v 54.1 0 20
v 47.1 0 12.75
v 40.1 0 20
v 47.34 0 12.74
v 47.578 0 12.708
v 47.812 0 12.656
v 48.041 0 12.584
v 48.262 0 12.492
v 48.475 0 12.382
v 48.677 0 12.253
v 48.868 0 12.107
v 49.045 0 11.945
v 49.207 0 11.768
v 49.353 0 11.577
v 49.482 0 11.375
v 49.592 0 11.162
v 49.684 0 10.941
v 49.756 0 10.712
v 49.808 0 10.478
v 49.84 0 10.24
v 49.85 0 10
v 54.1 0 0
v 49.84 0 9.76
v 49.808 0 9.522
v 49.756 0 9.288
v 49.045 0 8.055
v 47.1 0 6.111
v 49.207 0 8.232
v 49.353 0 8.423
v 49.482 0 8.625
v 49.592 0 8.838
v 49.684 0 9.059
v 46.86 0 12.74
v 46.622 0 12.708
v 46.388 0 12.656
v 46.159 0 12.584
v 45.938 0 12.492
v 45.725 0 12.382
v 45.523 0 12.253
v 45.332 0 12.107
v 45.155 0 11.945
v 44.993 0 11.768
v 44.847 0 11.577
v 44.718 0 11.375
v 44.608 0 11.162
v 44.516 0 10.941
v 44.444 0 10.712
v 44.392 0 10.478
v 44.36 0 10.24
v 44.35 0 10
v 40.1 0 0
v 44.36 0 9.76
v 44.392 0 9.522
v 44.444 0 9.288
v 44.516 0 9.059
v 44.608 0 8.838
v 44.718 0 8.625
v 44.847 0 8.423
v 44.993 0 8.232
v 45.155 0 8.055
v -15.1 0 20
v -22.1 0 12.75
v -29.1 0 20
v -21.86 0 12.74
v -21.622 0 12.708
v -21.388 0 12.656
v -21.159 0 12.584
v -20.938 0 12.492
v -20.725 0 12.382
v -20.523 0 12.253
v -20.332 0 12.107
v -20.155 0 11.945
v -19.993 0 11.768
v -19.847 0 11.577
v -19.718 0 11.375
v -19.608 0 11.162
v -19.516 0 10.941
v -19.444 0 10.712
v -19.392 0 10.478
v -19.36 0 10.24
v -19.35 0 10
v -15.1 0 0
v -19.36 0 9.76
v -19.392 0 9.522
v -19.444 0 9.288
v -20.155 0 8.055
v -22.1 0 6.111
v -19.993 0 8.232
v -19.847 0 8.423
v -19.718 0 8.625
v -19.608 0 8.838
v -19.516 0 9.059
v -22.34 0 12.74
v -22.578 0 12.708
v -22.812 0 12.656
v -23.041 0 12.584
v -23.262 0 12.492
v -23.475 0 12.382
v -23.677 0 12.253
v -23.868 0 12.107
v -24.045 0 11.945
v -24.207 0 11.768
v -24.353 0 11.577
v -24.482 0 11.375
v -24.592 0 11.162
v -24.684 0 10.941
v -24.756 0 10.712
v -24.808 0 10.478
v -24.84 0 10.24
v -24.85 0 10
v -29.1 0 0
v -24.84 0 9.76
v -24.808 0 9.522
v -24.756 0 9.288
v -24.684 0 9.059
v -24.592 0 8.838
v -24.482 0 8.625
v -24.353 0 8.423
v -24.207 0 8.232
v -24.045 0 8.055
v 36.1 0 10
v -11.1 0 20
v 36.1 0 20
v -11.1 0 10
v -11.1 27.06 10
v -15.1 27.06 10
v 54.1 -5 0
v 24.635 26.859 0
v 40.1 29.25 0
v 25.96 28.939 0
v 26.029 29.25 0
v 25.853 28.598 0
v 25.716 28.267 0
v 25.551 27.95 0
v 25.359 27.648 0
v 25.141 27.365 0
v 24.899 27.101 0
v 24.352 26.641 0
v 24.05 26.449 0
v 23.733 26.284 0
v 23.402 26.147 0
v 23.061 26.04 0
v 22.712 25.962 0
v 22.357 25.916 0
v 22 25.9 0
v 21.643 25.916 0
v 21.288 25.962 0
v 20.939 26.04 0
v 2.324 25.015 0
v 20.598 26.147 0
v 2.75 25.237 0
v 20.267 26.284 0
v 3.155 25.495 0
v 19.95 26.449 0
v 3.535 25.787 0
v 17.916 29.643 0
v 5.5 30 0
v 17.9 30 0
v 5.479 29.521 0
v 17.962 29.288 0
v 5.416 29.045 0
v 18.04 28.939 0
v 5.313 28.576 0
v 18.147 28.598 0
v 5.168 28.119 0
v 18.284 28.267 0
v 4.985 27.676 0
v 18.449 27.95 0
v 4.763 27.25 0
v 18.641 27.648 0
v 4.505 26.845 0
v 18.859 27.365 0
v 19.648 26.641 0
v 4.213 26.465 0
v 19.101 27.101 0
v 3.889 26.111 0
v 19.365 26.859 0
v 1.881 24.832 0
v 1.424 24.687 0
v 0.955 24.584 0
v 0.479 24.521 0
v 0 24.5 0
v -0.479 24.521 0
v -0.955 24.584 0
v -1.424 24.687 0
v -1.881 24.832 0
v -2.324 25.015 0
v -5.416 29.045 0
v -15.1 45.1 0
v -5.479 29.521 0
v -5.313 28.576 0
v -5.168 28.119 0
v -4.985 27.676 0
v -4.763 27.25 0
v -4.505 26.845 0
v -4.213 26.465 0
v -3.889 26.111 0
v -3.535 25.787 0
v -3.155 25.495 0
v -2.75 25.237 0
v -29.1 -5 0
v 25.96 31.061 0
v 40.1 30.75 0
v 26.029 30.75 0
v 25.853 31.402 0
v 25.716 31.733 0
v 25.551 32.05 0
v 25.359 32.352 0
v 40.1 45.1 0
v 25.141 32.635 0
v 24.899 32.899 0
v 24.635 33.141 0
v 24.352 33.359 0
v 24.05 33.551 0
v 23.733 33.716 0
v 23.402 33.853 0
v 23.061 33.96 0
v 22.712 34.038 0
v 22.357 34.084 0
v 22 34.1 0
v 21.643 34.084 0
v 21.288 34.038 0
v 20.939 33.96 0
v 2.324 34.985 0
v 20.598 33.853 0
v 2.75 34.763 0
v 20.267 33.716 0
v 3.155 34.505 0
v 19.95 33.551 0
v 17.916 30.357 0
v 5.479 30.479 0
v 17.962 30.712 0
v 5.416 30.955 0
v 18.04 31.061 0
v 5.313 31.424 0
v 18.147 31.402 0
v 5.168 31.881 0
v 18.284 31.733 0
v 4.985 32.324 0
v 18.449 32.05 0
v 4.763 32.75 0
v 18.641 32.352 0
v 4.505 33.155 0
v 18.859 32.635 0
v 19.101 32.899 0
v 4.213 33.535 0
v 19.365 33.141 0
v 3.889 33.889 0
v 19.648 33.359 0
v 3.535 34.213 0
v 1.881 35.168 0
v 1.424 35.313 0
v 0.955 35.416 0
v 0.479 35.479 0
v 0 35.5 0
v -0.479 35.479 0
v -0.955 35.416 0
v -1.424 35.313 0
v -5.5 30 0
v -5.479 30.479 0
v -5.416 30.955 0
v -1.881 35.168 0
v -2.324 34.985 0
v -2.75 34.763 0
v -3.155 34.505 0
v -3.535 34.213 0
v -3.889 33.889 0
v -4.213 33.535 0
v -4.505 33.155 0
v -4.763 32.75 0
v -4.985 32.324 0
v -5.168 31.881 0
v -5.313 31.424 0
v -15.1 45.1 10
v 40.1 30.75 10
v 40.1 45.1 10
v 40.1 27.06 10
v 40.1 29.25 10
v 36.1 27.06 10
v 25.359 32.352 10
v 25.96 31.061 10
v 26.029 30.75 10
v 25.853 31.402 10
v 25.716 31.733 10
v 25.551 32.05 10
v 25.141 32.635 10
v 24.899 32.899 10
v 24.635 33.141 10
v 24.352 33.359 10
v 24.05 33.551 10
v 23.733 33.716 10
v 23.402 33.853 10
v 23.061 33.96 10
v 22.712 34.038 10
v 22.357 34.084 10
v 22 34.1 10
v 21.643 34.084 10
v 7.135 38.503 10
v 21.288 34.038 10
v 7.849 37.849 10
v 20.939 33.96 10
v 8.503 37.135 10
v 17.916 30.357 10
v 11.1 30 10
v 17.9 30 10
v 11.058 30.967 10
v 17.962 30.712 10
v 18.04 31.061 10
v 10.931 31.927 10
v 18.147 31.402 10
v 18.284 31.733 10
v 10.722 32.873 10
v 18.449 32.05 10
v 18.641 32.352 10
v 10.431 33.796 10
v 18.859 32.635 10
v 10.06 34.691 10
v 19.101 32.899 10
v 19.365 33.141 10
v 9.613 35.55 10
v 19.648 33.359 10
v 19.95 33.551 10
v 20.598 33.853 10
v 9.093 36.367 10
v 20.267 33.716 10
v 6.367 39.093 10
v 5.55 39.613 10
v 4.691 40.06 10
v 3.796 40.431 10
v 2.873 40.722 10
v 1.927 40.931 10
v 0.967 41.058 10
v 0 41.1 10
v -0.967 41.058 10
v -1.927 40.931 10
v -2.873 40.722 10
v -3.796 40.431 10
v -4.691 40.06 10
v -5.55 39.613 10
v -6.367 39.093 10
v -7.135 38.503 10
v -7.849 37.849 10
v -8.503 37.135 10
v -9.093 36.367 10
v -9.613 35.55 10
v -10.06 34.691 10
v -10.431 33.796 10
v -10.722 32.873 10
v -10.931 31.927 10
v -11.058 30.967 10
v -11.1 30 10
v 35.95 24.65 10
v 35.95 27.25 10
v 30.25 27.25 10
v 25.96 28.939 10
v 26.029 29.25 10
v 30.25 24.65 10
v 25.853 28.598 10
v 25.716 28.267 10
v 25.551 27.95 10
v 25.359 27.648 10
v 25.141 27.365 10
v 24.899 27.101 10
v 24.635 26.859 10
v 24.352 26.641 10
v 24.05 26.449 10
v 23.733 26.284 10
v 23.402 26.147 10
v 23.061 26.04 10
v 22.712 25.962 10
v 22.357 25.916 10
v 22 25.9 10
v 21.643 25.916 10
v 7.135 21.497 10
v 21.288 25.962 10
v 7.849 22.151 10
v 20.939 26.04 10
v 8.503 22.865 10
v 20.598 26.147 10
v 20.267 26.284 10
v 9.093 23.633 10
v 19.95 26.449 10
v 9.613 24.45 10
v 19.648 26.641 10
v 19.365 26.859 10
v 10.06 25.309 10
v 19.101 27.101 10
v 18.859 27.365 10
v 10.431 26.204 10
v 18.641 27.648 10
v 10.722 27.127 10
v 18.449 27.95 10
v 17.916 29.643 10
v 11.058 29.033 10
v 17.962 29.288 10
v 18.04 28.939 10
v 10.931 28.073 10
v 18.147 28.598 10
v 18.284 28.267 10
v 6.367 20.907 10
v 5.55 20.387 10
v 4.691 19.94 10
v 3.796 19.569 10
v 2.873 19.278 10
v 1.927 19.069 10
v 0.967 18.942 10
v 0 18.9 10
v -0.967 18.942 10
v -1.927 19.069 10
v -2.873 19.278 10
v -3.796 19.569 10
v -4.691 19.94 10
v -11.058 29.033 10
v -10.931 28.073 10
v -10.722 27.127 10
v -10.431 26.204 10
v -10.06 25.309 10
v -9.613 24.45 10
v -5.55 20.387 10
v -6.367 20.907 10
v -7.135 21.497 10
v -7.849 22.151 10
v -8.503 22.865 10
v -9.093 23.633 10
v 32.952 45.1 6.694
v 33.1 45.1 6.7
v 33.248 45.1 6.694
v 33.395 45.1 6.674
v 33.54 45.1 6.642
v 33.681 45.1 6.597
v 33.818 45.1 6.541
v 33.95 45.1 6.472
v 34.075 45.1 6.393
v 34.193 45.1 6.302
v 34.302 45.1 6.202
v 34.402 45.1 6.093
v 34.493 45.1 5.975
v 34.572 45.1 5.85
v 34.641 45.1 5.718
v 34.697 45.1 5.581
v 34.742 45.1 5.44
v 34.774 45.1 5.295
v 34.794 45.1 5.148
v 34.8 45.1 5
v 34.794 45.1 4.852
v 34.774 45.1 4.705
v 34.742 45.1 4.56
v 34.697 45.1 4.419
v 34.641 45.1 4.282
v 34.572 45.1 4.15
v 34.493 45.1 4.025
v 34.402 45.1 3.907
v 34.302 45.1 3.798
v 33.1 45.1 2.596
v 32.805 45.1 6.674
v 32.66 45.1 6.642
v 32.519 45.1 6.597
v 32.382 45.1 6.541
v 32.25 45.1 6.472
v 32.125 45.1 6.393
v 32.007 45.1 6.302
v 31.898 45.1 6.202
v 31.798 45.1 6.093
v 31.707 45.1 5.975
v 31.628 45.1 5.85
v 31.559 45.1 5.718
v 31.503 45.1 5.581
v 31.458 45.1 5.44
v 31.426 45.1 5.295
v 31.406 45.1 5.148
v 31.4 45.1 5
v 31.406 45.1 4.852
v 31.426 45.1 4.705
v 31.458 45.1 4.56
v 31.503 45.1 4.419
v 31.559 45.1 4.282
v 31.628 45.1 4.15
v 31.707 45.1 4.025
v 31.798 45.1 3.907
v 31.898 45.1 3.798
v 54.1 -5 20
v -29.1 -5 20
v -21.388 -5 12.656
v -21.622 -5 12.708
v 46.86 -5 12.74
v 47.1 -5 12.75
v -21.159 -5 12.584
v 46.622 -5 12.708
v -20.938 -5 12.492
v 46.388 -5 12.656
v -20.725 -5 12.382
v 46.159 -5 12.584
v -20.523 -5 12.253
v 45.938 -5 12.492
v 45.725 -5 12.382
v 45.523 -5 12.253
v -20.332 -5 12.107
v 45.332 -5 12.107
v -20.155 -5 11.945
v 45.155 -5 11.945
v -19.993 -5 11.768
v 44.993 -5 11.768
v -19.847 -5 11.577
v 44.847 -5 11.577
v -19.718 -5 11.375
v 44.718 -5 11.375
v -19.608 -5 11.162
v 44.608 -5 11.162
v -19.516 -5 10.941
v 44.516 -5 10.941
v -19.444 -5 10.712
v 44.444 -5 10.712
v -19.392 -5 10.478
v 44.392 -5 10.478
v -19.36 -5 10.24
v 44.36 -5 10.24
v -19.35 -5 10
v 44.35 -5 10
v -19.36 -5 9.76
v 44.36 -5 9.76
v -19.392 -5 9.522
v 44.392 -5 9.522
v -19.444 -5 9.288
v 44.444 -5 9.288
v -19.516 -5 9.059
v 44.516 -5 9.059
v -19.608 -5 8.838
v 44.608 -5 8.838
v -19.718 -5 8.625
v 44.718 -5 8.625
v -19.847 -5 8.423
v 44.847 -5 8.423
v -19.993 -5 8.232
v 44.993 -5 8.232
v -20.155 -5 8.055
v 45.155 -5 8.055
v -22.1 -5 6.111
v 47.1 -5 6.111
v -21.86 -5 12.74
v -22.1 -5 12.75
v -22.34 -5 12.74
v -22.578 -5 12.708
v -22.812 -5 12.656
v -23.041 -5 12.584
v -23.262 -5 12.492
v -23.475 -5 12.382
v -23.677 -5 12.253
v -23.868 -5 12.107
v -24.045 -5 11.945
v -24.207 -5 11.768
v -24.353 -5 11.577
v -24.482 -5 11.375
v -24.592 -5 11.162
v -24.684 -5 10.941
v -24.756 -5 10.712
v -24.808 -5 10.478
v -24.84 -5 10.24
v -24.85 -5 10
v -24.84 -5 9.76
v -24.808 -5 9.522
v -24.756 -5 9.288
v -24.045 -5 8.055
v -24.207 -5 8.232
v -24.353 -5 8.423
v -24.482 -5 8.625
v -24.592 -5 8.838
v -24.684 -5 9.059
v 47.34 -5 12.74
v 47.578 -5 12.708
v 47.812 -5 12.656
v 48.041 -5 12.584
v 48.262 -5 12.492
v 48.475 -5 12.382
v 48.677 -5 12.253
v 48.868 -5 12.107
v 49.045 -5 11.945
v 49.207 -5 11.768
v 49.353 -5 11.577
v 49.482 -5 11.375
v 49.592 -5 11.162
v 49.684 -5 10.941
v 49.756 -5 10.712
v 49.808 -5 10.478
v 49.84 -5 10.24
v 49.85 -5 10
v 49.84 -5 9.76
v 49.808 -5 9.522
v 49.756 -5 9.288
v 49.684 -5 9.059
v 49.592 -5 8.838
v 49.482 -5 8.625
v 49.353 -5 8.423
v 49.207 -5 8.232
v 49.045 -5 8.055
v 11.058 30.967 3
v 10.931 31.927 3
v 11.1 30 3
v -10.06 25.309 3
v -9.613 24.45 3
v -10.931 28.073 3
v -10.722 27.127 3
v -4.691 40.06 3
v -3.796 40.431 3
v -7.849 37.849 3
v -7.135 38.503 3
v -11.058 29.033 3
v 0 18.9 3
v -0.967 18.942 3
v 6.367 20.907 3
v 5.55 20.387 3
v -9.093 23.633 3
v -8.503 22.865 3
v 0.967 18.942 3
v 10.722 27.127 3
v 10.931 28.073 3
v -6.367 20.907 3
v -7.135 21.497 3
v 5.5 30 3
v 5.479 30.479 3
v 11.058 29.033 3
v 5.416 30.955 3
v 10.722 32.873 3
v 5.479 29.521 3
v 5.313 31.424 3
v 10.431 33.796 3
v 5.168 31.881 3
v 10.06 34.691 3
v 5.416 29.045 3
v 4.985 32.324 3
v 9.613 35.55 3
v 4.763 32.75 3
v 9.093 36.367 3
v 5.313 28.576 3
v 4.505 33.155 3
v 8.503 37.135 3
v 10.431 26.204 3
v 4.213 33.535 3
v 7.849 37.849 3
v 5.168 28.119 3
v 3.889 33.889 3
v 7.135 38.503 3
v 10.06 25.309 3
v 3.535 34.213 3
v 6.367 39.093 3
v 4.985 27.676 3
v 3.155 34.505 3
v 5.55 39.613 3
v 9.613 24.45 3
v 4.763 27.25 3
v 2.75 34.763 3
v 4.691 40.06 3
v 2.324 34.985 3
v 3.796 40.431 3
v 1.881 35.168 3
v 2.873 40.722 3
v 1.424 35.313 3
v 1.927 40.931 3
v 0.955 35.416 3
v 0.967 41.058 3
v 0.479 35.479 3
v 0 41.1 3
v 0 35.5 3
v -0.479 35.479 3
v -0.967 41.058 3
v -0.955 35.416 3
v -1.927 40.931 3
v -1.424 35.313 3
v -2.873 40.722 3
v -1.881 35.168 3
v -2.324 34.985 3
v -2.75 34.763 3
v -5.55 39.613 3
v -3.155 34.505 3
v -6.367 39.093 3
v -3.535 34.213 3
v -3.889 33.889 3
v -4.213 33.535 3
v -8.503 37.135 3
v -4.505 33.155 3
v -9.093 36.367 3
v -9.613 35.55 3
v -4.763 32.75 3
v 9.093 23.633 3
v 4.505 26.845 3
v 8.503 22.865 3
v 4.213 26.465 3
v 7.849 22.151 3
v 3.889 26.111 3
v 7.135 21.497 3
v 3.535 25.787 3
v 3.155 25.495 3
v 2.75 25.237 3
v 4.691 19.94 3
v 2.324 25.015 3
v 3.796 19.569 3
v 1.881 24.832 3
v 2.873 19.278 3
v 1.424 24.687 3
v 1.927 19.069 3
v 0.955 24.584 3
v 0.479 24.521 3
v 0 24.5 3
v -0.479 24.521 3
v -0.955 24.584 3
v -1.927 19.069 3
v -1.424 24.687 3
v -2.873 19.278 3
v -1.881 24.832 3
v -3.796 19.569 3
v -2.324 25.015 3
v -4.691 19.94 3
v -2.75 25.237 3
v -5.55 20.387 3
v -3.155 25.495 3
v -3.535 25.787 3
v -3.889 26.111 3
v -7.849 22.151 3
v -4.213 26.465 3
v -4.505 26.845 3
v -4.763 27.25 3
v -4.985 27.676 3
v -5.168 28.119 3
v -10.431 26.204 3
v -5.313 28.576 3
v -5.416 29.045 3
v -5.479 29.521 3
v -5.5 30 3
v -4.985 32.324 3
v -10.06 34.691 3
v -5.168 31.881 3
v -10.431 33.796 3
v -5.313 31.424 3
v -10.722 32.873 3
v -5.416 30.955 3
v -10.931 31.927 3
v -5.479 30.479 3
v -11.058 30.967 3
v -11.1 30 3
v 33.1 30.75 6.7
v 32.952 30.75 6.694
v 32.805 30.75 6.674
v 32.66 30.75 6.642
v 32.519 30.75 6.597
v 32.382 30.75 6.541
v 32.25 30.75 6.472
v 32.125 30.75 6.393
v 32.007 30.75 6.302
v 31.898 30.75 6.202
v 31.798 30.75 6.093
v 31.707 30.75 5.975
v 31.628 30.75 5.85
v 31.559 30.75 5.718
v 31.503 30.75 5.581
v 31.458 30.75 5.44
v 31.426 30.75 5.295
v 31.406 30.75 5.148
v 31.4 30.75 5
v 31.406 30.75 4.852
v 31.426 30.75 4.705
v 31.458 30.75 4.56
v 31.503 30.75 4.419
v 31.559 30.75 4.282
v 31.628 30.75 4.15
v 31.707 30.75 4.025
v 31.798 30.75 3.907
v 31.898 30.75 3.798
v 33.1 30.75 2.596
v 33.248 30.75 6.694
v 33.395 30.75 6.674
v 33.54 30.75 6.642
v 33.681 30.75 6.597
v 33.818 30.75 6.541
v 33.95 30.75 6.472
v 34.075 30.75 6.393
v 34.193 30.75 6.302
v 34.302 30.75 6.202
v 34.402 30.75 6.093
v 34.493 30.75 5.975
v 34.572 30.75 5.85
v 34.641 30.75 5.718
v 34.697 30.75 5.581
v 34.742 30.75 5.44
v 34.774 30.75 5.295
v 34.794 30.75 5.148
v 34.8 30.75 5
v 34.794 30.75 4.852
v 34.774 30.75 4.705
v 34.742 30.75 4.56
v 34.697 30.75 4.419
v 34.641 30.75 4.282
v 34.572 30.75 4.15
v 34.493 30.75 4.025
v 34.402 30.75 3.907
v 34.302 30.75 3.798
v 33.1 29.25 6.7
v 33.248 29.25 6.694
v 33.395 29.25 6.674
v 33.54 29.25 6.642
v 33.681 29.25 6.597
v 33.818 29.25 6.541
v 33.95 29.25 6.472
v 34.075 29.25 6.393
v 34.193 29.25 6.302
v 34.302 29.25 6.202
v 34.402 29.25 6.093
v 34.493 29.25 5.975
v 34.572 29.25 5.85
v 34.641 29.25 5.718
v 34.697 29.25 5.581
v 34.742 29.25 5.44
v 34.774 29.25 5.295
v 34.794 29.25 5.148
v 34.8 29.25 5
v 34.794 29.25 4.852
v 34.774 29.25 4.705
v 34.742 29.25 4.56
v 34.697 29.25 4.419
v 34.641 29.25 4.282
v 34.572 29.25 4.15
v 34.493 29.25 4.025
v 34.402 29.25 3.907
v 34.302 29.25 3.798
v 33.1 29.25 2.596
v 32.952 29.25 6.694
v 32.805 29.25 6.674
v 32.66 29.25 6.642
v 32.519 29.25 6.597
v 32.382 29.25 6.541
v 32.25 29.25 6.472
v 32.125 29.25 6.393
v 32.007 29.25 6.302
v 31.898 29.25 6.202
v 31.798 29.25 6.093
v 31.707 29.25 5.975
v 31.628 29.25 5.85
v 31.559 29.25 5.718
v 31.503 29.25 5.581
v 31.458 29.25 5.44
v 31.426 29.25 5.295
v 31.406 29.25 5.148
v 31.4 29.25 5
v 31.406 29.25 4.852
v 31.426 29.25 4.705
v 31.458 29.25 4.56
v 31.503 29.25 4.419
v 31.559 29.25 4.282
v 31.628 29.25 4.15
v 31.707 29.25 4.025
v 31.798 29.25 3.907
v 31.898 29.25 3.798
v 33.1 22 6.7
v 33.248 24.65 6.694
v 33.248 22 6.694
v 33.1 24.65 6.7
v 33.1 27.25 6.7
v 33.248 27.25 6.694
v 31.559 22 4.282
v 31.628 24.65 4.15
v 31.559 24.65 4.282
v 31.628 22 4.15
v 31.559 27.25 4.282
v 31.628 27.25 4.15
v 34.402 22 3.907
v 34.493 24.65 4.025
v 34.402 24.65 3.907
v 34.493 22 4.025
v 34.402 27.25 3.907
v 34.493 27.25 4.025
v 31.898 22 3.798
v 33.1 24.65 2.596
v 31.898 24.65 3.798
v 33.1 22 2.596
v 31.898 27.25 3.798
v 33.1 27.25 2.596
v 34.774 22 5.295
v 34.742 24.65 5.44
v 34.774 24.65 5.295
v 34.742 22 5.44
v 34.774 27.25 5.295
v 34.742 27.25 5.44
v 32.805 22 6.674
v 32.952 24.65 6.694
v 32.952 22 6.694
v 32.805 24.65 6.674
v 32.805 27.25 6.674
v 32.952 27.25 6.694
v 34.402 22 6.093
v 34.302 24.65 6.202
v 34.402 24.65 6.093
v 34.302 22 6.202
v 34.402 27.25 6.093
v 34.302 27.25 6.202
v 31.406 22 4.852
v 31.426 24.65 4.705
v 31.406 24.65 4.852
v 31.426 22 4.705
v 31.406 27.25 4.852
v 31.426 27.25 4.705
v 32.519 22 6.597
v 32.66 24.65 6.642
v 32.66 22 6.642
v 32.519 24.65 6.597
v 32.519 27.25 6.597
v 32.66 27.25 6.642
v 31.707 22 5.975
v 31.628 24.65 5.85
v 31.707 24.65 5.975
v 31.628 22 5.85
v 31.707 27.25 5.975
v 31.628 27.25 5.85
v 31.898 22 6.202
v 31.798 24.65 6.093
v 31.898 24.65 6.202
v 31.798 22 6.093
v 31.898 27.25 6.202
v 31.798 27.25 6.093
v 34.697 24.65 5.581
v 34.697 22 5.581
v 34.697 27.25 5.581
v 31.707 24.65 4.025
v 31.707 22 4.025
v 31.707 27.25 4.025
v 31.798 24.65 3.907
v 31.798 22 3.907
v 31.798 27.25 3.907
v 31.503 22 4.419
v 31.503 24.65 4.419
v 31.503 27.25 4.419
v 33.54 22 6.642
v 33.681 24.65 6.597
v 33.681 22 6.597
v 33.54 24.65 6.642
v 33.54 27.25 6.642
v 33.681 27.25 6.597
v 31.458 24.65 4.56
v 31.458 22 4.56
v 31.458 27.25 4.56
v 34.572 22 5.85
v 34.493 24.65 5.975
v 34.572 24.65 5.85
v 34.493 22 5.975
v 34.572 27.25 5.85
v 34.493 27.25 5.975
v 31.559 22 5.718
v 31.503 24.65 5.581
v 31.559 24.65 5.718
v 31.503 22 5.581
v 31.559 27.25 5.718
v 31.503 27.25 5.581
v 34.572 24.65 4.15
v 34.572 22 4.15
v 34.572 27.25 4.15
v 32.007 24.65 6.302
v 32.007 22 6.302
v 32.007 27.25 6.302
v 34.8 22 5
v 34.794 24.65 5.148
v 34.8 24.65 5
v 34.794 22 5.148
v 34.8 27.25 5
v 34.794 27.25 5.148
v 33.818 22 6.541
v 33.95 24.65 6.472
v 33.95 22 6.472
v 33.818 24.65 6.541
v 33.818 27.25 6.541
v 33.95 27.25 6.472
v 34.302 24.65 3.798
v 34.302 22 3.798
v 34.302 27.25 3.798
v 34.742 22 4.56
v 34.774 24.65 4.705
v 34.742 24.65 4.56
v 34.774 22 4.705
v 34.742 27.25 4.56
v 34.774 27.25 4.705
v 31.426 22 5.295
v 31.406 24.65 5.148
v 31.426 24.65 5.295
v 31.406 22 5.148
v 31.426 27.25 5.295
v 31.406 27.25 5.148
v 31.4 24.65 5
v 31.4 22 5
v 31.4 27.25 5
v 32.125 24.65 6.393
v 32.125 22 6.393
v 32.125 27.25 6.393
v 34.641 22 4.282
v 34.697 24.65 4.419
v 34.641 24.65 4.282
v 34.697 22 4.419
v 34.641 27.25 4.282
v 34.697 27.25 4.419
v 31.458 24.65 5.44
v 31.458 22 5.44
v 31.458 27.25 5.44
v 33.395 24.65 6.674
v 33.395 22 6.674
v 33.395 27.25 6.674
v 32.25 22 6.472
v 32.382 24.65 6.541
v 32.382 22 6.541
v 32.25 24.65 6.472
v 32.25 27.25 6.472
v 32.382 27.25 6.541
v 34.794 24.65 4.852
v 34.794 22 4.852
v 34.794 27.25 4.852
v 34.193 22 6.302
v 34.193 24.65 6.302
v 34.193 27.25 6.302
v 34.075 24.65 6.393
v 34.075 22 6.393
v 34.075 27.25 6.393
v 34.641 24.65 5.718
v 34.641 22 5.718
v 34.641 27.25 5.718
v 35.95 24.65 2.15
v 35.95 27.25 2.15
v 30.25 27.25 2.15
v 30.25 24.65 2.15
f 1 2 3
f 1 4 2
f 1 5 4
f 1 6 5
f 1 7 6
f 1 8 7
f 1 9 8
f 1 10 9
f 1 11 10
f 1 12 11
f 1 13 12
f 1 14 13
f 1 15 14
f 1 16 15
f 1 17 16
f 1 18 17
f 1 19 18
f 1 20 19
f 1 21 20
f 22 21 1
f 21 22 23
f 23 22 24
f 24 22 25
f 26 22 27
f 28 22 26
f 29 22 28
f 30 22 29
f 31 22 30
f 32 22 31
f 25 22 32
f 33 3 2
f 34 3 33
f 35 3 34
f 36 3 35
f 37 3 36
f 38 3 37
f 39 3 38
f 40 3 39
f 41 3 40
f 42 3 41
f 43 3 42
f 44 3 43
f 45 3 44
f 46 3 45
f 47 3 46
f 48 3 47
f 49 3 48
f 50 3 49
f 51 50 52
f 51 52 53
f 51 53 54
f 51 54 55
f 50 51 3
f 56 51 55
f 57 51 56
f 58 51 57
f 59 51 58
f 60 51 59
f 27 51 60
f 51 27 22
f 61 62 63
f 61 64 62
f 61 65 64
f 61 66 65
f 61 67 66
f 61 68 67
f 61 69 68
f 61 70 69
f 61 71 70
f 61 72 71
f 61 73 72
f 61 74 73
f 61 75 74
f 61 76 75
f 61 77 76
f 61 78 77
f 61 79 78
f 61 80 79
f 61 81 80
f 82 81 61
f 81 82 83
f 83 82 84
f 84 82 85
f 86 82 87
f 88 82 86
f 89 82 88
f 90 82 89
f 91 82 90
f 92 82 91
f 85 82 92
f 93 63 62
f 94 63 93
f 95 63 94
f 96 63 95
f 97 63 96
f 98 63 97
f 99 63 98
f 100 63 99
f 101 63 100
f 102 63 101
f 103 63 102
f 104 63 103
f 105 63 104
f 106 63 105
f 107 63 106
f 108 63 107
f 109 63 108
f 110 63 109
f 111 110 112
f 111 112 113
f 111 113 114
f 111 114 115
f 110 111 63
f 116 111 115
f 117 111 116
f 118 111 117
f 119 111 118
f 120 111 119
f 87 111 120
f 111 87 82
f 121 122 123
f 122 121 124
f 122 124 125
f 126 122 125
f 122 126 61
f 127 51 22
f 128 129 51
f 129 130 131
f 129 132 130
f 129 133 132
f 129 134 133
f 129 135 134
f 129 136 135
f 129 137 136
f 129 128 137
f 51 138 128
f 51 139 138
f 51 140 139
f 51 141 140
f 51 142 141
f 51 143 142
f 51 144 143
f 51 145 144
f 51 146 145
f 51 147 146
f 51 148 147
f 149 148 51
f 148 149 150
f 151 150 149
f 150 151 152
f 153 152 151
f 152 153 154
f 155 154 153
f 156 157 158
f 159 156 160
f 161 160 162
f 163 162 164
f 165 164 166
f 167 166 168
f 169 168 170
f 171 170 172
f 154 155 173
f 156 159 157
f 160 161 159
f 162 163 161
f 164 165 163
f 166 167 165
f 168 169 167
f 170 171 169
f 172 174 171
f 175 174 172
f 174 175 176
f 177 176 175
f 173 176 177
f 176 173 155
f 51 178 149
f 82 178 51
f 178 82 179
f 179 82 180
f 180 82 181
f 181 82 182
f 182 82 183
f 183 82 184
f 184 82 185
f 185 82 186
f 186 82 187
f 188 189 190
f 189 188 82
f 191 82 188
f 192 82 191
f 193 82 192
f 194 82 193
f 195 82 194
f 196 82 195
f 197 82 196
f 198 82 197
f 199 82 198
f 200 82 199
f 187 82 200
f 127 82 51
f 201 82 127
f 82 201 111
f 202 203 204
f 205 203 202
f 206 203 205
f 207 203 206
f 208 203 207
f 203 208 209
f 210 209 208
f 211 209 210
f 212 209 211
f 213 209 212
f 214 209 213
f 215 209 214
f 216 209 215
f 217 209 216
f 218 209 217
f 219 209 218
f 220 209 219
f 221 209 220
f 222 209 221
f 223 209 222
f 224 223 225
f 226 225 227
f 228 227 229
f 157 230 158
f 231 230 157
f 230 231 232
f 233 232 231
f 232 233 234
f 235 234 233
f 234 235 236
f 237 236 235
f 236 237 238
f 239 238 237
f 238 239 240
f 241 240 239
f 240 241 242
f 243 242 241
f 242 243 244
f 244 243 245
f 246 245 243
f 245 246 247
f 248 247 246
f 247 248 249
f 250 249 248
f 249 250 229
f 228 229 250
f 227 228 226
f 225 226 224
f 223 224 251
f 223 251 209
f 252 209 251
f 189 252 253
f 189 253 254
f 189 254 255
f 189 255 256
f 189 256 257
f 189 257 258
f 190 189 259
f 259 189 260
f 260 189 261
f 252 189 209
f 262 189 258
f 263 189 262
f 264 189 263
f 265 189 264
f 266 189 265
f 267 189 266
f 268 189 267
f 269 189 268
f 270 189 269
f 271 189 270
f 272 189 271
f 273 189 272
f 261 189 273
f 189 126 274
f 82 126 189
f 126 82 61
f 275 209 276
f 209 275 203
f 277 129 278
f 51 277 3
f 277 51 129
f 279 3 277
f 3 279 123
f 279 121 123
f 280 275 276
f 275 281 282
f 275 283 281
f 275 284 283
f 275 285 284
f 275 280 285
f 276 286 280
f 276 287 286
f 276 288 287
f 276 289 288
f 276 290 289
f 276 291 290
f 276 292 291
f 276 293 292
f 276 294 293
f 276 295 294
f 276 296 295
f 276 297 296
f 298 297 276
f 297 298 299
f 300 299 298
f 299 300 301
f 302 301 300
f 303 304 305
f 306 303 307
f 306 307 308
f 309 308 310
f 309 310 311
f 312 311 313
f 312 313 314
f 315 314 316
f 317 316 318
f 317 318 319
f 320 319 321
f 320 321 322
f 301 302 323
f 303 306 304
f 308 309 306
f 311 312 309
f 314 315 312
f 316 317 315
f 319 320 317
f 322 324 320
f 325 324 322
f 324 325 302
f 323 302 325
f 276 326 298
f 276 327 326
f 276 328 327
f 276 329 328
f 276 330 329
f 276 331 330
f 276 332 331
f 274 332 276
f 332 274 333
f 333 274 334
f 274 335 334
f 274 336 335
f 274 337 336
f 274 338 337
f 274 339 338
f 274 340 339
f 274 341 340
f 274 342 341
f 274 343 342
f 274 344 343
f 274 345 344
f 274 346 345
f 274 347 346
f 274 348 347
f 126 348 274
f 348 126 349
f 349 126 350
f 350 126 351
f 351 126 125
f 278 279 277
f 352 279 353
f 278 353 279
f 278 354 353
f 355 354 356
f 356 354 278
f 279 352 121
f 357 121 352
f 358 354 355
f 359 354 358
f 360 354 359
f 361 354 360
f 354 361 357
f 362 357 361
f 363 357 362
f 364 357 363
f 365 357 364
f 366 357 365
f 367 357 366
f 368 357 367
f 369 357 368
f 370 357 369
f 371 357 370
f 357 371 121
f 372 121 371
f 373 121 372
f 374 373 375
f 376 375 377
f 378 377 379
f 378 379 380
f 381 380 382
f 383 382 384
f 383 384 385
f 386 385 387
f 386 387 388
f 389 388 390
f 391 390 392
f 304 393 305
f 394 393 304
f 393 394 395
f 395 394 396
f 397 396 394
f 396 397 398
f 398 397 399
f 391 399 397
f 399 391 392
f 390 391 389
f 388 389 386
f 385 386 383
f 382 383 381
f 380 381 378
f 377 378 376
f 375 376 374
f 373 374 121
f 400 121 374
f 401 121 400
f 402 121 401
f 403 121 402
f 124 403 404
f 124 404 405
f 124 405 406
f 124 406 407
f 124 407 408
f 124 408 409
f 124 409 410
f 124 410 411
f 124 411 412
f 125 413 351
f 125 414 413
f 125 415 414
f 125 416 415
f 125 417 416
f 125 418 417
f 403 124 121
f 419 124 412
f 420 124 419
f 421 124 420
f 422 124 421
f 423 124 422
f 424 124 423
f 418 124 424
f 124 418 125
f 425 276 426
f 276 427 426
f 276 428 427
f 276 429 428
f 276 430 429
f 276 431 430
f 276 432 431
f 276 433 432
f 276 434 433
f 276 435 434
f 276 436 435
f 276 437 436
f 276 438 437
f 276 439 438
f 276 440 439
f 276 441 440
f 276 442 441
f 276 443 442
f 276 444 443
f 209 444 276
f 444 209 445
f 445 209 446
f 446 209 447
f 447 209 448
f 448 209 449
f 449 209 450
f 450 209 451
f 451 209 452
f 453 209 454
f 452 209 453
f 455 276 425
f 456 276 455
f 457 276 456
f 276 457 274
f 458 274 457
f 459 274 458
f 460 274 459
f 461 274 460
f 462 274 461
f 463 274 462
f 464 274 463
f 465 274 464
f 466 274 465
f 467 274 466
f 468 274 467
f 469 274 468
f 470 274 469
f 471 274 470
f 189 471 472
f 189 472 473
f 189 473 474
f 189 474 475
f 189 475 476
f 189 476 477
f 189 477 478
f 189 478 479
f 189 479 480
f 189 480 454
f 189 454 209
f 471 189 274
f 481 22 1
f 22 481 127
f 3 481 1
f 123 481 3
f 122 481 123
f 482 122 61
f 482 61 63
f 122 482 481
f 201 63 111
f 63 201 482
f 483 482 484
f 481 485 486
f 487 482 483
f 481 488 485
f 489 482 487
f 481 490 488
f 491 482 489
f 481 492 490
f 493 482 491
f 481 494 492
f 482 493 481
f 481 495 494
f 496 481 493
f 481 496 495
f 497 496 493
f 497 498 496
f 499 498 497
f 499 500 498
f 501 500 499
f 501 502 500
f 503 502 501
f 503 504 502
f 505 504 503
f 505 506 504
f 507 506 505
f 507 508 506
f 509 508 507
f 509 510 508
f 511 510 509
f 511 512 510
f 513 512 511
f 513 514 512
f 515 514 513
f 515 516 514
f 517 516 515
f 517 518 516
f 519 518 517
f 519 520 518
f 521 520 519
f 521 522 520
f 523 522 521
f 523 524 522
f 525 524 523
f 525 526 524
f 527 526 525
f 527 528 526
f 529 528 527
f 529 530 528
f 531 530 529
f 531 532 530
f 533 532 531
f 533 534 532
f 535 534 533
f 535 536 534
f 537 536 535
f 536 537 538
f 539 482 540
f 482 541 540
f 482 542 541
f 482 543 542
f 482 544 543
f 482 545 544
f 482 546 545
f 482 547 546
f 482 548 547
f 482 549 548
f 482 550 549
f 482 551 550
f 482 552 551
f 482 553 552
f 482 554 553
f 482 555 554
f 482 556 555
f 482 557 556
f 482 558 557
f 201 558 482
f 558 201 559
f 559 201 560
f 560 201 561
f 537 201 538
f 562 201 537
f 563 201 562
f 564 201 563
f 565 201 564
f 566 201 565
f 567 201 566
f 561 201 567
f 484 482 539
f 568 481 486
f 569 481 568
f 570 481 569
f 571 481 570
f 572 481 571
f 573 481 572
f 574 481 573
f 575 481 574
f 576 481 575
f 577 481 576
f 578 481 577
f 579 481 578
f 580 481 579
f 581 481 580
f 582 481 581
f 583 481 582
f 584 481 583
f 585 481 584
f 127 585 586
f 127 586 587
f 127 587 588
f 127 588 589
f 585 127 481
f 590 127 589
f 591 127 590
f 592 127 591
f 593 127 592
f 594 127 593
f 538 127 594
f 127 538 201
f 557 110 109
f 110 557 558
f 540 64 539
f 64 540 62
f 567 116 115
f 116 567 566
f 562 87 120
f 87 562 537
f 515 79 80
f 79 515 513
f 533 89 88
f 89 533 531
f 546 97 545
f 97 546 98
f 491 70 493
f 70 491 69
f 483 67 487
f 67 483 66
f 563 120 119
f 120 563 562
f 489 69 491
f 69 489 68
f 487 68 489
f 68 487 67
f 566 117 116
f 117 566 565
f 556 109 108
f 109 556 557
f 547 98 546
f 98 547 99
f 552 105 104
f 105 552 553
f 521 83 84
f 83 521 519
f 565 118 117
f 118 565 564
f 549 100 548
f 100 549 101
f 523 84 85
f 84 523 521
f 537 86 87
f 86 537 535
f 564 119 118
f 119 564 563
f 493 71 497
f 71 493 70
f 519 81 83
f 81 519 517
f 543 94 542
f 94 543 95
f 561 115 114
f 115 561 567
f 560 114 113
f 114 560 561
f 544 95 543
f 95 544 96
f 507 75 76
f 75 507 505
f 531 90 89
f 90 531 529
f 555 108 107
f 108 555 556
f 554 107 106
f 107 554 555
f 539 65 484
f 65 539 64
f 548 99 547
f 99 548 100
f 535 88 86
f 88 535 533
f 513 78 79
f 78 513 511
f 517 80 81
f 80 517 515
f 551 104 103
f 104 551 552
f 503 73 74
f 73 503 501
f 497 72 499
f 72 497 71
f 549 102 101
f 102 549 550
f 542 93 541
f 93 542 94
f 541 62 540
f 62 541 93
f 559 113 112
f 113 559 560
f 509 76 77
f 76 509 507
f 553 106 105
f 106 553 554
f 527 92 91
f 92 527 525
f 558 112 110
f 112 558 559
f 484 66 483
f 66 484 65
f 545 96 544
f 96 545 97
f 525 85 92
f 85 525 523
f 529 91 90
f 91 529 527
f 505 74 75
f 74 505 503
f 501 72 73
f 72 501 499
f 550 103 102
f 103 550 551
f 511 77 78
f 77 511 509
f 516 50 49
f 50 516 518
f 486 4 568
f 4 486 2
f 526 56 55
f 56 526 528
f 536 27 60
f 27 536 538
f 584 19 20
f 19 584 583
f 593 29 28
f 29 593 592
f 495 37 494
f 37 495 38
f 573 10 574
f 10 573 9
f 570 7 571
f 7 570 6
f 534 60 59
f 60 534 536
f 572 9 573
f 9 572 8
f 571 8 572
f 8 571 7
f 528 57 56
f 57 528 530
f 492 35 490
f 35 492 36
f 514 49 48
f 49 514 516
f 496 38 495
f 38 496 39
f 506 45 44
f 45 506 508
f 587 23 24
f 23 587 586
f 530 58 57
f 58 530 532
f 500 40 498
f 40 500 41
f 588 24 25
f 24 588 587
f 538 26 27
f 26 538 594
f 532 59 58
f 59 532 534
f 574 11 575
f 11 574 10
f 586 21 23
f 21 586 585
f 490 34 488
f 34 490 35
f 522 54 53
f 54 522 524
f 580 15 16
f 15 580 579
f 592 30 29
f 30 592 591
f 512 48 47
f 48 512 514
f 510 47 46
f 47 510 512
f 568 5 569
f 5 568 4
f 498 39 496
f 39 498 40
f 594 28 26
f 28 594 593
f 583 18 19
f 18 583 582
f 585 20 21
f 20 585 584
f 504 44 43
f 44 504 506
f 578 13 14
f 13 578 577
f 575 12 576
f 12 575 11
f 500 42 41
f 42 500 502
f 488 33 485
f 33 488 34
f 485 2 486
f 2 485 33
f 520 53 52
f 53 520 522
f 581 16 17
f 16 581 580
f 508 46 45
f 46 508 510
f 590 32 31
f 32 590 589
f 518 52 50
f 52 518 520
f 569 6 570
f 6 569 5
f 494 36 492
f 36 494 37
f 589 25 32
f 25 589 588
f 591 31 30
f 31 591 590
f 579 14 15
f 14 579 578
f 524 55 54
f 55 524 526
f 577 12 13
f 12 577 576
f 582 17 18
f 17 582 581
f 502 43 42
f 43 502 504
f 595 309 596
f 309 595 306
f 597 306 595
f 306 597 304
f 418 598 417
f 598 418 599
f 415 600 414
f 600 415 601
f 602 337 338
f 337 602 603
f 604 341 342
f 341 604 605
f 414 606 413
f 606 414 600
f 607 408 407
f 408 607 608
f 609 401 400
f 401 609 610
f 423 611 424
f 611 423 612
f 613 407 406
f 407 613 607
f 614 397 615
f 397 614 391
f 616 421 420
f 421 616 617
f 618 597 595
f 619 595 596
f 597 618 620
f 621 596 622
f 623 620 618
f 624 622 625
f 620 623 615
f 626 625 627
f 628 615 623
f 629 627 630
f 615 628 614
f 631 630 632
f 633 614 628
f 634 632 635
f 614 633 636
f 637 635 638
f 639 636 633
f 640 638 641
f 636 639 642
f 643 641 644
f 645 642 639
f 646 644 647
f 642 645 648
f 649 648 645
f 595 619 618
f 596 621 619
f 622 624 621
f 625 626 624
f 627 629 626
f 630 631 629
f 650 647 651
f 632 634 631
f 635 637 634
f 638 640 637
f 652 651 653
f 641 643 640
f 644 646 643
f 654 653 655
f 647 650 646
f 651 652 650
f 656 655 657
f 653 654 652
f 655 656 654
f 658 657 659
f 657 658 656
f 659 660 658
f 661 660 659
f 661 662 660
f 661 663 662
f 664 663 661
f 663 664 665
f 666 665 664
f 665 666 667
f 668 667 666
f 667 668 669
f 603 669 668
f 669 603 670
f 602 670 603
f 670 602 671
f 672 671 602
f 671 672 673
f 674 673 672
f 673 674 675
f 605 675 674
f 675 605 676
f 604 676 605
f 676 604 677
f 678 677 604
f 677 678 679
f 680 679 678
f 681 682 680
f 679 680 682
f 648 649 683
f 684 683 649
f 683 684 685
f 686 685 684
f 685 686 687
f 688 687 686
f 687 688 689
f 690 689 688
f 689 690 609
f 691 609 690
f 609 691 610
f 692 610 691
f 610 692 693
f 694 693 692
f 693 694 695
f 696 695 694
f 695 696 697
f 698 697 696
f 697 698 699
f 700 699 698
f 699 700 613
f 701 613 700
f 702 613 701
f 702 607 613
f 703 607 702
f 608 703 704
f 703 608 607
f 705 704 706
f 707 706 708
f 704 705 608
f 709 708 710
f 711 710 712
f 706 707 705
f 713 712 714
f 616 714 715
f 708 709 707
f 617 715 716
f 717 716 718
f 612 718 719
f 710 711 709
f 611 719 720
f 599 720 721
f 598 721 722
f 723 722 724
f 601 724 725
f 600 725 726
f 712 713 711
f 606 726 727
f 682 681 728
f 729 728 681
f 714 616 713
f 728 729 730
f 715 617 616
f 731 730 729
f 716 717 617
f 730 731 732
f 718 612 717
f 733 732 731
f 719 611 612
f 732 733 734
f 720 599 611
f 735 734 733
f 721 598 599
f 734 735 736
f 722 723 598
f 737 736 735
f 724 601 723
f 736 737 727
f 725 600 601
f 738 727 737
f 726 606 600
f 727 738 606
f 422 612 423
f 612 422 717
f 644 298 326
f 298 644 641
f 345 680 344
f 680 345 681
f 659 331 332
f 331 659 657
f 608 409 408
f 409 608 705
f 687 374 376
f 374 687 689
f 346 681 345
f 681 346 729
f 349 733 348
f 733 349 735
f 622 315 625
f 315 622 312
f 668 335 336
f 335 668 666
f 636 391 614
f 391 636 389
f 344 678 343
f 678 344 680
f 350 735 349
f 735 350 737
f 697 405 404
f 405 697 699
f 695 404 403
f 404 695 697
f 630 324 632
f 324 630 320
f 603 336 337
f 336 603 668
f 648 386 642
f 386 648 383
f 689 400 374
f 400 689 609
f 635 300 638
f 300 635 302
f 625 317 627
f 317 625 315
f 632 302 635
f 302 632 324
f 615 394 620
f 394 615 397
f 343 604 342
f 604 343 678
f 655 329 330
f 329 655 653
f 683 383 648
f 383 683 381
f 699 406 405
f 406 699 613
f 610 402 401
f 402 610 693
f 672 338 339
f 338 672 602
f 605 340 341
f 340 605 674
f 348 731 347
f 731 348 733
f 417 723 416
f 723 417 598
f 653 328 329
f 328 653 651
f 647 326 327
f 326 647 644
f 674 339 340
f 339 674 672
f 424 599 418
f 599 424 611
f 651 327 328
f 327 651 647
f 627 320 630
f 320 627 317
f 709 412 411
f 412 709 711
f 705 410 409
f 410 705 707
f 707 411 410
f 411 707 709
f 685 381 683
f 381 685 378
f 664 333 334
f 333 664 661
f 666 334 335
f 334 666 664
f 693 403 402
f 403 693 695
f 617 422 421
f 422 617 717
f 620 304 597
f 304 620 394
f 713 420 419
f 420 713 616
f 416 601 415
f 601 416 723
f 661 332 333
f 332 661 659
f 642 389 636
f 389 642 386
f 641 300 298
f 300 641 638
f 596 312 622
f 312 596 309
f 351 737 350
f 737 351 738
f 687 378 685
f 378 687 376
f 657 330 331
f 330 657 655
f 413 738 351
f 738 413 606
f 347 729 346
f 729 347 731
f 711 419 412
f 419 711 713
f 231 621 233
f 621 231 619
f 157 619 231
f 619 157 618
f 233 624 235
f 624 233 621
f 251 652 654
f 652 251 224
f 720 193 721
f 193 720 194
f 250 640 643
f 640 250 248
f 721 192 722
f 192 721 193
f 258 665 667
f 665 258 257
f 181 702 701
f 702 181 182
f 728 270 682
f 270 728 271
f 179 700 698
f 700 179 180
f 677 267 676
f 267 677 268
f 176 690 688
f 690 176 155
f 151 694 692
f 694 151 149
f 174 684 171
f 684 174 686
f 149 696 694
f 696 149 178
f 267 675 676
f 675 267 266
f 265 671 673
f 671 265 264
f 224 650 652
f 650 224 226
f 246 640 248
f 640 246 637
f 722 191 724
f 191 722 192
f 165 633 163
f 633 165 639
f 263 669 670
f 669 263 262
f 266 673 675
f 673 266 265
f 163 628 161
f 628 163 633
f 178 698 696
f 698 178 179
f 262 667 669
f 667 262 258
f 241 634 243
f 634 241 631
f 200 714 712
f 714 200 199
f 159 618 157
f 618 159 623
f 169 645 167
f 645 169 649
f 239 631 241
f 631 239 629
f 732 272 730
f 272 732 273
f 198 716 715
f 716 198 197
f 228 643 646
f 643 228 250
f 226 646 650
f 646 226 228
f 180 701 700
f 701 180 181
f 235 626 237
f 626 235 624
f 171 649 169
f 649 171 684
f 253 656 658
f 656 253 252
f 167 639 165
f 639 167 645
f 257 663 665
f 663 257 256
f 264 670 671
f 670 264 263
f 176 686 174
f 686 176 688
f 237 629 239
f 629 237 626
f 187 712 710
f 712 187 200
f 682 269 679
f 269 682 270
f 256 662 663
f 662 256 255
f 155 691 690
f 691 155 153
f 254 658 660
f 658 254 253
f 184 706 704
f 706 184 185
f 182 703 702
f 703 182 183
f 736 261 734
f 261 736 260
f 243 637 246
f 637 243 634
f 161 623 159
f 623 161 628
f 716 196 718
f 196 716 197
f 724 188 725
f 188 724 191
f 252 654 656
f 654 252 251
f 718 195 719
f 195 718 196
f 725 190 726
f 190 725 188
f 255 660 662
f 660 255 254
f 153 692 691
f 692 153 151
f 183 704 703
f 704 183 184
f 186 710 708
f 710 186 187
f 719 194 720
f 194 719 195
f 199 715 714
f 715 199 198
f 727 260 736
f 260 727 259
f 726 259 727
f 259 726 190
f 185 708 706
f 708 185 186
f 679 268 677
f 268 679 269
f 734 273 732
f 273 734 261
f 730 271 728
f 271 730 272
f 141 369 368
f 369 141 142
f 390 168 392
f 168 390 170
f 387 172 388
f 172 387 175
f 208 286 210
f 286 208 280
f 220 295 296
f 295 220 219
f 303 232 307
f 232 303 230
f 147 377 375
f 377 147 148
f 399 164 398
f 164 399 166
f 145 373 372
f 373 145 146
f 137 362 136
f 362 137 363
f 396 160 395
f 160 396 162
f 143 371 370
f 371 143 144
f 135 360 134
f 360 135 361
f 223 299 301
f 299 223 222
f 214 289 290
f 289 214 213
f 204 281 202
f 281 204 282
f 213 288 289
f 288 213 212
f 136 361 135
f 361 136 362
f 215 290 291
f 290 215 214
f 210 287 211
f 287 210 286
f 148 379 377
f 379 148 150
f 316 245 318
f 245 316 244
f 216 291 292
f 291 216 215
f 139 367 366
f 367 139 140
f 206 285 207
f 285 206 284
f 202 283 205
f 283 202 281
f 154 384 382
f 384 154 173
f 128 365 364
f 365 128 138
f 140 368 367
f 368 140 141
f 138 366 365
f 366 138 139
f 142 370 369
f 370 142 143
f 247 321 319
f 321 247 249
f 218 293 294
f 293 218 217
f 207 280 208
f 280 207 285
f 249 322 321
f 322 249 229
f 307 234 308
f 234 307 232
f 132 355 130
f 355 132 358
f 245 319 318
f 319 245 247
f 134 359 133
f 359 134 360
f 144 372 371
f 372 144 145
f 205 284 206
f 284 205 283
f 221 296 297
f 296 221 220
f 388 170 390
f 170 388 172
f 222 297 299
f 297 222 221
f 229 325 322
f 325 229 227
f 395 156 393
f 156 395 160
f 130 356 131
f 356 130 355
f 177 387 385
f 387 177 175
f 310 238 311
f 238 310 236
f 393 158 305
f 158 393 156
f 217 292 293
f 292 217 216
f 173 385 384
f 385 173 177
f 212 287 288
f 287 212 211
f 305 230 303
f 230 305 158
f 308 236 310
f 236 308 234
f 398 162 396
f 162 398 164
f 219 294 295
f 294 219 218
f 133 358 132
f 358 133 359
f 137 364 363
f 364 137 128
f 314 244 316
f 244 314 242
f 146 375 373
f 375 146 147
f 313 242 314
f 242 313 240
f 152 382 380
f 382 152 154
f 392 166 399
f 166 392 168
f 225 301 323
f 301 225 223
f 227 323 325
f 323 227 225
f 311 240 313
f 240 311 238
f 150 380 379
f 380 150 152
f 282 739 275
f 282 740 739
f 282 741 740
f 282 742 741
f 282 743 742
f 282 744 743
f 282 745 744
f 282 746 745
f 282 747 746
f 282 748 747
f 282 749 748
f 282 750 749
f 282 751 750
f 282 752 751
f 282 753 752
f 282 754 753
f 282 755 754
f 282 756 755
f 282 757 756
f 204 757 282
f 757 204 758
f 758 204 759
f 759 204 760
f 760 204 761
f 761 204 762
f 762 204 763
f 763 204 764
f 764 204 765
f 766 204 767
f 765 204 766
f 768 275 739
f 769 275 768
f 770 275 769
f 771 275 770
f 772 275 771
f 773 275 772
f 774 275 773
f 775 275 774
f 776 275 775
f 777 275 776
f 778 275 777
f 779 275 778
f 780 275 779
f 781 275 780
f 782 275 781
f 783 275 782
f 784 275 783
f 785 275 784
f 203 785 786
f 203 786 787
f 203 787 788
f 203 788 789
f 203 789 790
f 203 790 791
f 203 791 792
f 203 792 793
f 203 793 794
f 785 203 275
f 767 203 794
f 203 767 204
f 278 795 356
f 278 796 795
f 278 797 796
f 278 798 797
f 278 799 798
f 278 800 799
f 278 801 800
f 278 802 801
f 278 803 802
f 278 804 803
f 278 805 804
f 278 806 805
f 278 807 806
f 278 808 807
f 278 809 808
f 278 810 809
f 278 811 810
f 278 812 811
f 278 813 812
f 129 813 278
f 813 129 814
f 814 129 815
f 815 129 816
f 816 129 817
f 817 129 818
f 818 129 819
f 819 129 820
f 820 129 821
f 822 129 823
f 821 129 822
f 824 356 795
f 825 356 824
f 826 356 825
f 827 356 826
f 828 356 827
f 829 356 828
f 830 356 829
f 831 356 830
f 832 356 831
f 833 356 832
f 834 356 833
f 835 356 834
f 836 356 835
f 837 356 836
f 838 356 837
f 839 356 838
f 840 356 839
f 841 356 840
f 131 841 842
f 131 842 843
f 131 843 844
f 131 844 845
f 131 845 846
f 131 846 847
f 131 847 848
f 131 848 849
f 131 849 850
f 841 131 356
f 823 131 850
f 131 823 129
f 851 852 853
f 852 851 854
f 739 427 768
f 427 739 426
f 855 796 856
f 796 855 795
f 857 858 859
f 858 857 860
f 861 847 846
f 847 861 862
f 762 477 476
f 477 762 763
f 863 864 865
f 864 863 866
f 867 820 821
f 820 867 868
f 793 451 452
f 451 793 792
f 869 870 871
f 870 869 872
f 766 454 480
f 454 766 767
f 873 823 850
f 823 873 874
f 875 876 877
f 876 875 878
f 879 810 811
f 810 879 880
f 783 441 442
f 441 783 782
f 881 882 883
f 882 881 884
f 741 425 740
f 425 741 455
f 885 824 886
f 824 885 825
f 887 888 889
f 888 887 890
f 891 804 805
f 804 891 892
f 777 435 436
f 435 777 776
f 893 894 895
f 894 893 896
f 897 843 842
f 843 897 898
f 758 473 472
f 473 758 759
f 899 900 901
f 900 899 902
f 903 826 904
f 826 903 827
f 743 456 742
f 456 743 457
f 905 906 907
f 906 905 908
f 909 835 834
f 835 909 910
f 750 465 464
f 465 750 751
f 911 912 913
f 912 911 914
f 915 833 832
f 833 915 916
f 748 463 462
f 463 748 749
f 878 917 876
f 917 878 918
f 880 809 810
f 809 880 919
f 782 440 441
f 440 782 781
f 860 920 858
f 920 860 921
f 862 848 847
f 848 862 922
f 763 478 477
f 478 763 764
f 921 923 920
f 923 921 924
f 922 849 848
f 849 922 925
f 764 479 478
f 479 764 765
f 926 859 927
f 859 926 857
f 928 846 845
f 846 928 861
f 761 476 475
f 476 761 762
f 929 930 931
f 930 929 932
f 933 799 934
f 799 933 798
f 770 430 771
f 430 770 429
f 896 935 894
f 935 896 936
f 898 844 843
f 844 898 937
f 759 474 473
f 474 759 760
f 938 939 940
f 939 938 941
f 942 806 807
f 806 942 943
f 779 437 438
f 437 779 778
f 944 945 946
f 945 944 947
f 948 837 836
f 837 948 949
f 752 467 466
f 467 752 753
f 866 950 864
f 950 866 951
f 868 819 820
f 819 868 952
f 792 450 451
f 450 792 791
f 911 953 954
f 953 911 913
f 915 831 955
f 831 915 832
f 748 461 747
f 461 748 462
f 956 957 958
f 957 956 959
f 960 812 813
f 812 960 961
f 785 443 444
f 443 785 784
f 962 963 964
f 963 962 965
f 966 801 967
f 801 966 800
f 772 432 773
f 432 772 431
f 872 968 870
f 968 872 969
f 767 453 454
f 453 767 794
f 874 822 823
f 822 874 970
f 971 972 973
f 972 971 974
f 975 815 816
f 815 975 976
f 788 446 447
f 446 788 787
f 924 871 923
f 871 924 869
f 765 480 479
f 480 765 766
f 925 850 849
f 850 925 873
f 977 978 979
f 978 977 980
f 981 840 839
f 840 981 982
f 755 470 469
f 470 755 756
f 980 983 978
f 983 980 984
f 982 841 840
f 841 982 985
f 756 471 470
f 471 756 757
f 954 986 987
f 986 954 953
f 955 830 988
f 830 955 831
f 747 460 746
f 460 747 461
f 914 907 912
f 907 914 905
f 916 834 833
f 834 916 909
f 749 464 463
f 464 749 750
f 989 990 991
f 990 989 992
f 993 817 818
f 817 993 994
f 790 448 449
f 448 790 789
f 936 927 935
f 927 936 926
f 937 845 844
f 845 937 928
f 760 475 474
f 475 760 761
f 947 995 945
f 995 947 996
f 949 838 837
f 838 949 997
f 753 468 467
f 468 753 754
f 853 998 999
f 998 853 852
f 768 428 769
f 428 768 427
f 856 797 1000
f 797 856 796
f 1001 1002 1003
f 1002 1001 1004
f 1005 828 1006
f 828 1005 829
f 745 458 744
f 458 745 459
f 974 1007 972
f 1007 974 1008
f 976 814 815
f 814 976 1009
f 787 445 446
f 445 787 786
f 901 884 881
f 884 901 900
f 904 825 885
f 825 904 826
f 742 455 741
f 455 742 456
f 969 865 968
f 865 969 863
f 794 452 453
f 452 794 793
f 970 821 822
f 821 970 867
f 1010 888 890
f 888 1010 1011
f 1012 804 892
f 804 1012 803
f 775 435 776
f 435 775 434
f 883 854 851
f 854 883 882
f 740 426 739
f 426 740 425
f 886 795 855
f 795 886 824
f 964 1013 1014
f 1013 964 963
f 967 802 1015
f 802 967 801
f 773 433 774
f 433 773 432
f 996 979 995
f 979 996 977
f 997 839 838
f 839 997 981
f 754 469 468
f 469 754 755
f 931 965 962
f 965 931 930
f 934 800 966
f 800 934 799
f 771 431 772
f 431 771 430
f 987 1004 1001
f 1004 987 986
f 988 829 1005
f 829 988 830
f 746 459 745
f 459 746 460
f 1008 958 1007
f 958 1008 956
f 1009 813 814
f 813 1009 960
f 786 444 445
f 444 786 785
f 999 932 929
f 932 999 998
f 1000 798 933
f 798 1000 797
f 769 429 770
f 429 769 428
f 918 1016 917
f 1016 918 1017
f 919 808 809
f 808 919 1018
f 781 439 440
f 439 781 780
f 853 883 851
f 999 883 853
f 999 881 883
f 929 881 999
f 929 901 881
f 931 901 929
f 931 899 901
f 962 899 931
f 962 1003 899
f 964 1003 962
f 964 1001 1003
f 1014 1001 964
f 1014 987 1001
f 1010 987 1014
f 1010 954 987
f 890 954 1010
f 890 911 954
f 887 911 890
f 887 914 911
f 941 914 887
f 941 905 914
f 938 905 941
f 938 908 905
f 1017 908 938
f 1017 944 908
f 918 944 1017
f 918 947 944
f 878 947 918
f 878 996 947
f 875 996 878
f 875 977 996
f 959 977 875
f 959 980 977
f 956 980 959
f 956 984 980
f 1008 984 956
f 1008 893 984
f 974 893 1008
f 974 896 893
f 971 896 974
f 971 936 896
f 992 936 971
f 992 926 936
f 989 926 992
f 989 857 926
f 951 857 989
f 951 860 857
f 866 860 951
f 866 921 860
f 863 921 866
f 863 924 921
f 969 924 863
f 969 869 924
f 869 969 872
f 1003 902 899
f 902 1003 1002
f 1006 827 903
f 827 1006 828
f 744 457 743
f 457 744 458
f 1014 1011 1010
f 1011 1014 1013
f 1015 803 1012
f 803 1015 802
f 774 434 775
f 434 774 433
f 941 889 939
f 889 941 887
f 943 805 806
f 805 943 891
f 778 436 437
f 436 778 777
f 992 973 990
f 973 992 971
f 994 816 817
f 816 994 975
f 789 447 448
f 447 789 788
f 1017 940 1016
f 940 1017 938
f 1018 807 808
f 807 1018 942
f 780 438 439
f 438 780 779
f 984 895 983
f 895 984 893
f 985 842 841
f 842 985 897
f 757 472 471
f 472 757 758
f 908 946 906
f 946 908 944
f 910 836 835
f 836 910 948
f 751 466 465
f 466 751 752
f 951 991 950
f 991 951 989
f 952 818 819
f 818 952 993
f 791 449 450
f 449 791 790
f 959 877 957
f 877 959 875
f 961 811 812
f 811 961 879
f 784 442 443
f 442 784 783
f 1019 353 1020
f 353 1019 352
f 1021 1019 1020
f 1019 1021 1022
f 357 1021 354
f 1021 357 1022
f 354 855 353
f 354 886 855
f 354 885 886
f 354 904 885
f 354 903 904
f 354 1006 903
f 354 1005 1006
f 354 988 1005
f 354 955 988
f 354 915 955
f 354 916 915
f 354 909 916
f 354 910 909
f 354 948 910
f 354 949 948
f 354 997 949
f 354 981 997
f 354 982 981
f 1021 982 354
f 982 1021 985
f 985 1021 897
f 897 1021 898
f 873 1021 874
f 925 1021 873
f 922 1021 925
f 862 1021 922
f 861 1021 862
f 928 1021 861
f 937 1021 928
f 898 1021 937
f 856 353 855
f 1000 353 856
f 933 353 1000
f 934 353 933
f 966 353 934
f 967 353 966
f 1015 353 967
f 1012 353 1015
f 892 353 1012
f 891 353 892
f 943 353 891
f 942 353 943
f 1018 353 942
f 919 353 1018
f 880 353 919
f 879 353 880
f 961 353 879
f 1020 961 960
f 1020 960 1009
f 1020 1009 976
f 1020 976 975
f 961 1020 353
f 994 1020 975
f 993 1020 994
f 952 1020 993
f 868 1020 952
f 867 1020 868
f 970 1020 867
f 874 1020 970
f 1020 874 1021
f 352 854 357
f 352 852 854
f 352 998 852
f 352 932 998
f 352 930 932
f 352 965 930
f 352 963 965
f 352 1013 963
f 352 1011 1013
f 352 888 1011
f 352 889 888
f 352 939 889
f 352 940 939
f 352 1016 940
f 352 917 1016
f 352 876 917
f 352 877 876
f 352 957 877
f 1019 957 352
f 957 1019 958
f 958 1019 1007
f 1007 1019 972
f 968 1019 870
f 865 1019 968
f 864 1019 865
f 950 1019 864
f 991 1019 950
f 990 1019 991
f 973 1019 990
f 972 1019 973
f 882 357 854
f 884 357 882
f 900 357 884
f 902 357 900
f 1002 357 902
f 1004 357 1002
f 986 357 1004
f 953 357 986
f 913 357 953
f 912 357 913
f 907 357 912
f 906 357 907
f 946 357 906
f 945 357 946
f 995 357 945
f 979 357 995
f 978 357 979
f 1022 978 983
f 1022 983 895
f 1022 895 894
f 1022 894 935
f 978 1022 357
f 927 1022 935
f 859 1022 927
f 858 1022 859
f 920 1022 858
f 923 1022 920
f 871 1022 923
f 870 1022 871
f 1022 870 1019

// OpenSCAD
// Obere Z-Achsen-Halterung: Kugellager (Gewindespindel) + glatte Fuehrungsstange
// Fuer 2020-Alu-Profil mit M5-Schrauben und Nutensteinen.
//
// Gedruckt wird der Arm FLACH auf dem Bett, die Rueckwand steht senkrecht.
// Keine Stuetzstrukturen noetig: Lagersitz offen nach oben, waagerechte
// Bohrungen als Tropfenform (druckt ohne Ueberhang).
//
// Eingebaut liegt die Bettseite oben: Oberkante Arm = Oberkante Profil,
// das Lager wird von unten eingepresst und liegt oben an einem Absatz an.

/* [Lage der Achsen] */
// Abstand Profil-Vorderseite -> Mitte Spindel/Stange (mm)
achs_abstand   = 30;
// Abstand Spindel-Mitte -> Stangen-Mitte (mm)
mitten_abstand = 22;
// Stange rechts (false) oder links (true) neben der Spindel - fuer zweite Seite
gespiegelt     = false;

/* [Kugellager] */
lager_d        = 22.2;  // 608: 22 mm + Spiel
lager_h        = 7;     // 608: 7 mm
spindel_loch   = 11;    // Durchgang Spindel (8 mm) mit Luft

/* [Fuehrungsstange] */
stange_d       = 8.2;   // 8 mm + Spiel
schlitz        = 1.5;   // Klemmschlitz
m3_d           = 3.4;
m3_mutter_sw   = 5.7;   // Schluesselweite M3-Mutter + Spiel
m3_mutter_h    = 2.6;

/* [Profil / Befestigung] */
profil         = 20;    // 2020
m5_d           = 5.5;
loch_abstand   = 0;     // 0 = automatisch (Loecher links und rechts neben dem Arm)

/* [Wandstaerken] */
arm_t          = 10;    // Dicke Arm (muss > lager_h + 2)
wand           = 4;     // Rand um Lager/Stange
rueck_t        = 5;     // Dicke Rueckwand
fluegel        = 14;    // Breite der Schraublaschen neben dem Arm

$fn = 72;
e = 0.01;

// ---------------------------------------------------------------
lx = 0;                                // Lager-Mitte X
sx = mitten_abstand;                   // Stangen-Mitte X
klemm_x = sx + stange_d/2 + wand + 3;  // Lage der Klemmschraube
x_min = lx - lager_d/2 - wand;
x_max = klemm_x + 3 + wand;
arm_w = x_max - x_min;
arm_l = achs_abstand + lager_d/2 + wand;   // Laenge in Y ab Profilflaeche
platte_w = arm_w + 2*fluegel;
loch_x = loch_abstand > 0 ? loch_abstand/2 : arm_w/2 + fluegel/2;
xc = (x_min + x_max)/2;

module tropfen(d, l) {   // waagerechte Bohrung entlang Y, Spitze nach +Z
    rotate([-90,0,0]) linear_extrude(l, center=true)
        union() {
            circle(d=d);
            rotate(45) square(d/2);
        }
}

module halter() {
    difference() {
        union() {
            // Arm (flach auf dem Bett)
            translate([x_min, 0, 0]) cube([arm_w, arm_l, arm_t]);
            // Rueckwand mit Schraublaschen
            translate([xc - platte_w/2, -rueck_t, 0]) cube([platte_w, rueck_t, profil]);
            // Rippen zwischen Arm und Rueckwand
            for (x = [x_min, x_max - wand])
                translate([x, 0, 0]) rotate([90,0,90])
                    linear_extrude(wand)
                        polygon([[0,0],[arm_l*0.6,0],[arm_l*0.6,arm_t],[0,profil]]);
        }
        // Lagersitz: von oben offen, Absatz unten
        translate([lx, achs_abstand, arm_t - lager_h]) cylinder(d=lager_d, h=lager_h + e);
        translate([lx, achs_abstand, -e]) cylinder(d=spindel_loch, h=arm_t + 2*e);
        // Stange durchgehend + Klemmschlitz zur Aussenkante
        translate([sx, achs_abstand, -e]) cylinder(d=stange_d, h=arm_t + 2*e);
        translate([sx, achs_abstand - schlitz/2, -e]) cube([x_max - sx + e, schlitz, arm_t + 2*e]);
        // Klemmschraube M3 quer zum Schlitz, von der Vorderkante eingesteckt (M3x16..20)
        translate([klemm_x, (achs_abstand - 8 + arm_l + 1)/2, arm_t/2])
            tropfen(m3_d, arm_l + 1 - (achs_abstand - 8));
        // Mutterschlitz M3 hinter dem Schlitz, von oben eingeschoben
        translate([klemm_x - m3_mutter_sw/2, achs_abstand - schlitz/2 - 2 - m3_mutter_h, arm_t/2 - m3_mutter_sw/2])
            cube([m3_mutter_sw, m3_mutter_h, arm_t]);
        // M5-Loecher in den Laschen
        for (s = [-1, 1])
            translate([xc + s*loch_x, -rueck_t/2, profil/2]) tropfen(m5_d, rueck_t + 2);
    }
}

if (gespiegelt) mirror([1,0,0]) halter(); else halter();
